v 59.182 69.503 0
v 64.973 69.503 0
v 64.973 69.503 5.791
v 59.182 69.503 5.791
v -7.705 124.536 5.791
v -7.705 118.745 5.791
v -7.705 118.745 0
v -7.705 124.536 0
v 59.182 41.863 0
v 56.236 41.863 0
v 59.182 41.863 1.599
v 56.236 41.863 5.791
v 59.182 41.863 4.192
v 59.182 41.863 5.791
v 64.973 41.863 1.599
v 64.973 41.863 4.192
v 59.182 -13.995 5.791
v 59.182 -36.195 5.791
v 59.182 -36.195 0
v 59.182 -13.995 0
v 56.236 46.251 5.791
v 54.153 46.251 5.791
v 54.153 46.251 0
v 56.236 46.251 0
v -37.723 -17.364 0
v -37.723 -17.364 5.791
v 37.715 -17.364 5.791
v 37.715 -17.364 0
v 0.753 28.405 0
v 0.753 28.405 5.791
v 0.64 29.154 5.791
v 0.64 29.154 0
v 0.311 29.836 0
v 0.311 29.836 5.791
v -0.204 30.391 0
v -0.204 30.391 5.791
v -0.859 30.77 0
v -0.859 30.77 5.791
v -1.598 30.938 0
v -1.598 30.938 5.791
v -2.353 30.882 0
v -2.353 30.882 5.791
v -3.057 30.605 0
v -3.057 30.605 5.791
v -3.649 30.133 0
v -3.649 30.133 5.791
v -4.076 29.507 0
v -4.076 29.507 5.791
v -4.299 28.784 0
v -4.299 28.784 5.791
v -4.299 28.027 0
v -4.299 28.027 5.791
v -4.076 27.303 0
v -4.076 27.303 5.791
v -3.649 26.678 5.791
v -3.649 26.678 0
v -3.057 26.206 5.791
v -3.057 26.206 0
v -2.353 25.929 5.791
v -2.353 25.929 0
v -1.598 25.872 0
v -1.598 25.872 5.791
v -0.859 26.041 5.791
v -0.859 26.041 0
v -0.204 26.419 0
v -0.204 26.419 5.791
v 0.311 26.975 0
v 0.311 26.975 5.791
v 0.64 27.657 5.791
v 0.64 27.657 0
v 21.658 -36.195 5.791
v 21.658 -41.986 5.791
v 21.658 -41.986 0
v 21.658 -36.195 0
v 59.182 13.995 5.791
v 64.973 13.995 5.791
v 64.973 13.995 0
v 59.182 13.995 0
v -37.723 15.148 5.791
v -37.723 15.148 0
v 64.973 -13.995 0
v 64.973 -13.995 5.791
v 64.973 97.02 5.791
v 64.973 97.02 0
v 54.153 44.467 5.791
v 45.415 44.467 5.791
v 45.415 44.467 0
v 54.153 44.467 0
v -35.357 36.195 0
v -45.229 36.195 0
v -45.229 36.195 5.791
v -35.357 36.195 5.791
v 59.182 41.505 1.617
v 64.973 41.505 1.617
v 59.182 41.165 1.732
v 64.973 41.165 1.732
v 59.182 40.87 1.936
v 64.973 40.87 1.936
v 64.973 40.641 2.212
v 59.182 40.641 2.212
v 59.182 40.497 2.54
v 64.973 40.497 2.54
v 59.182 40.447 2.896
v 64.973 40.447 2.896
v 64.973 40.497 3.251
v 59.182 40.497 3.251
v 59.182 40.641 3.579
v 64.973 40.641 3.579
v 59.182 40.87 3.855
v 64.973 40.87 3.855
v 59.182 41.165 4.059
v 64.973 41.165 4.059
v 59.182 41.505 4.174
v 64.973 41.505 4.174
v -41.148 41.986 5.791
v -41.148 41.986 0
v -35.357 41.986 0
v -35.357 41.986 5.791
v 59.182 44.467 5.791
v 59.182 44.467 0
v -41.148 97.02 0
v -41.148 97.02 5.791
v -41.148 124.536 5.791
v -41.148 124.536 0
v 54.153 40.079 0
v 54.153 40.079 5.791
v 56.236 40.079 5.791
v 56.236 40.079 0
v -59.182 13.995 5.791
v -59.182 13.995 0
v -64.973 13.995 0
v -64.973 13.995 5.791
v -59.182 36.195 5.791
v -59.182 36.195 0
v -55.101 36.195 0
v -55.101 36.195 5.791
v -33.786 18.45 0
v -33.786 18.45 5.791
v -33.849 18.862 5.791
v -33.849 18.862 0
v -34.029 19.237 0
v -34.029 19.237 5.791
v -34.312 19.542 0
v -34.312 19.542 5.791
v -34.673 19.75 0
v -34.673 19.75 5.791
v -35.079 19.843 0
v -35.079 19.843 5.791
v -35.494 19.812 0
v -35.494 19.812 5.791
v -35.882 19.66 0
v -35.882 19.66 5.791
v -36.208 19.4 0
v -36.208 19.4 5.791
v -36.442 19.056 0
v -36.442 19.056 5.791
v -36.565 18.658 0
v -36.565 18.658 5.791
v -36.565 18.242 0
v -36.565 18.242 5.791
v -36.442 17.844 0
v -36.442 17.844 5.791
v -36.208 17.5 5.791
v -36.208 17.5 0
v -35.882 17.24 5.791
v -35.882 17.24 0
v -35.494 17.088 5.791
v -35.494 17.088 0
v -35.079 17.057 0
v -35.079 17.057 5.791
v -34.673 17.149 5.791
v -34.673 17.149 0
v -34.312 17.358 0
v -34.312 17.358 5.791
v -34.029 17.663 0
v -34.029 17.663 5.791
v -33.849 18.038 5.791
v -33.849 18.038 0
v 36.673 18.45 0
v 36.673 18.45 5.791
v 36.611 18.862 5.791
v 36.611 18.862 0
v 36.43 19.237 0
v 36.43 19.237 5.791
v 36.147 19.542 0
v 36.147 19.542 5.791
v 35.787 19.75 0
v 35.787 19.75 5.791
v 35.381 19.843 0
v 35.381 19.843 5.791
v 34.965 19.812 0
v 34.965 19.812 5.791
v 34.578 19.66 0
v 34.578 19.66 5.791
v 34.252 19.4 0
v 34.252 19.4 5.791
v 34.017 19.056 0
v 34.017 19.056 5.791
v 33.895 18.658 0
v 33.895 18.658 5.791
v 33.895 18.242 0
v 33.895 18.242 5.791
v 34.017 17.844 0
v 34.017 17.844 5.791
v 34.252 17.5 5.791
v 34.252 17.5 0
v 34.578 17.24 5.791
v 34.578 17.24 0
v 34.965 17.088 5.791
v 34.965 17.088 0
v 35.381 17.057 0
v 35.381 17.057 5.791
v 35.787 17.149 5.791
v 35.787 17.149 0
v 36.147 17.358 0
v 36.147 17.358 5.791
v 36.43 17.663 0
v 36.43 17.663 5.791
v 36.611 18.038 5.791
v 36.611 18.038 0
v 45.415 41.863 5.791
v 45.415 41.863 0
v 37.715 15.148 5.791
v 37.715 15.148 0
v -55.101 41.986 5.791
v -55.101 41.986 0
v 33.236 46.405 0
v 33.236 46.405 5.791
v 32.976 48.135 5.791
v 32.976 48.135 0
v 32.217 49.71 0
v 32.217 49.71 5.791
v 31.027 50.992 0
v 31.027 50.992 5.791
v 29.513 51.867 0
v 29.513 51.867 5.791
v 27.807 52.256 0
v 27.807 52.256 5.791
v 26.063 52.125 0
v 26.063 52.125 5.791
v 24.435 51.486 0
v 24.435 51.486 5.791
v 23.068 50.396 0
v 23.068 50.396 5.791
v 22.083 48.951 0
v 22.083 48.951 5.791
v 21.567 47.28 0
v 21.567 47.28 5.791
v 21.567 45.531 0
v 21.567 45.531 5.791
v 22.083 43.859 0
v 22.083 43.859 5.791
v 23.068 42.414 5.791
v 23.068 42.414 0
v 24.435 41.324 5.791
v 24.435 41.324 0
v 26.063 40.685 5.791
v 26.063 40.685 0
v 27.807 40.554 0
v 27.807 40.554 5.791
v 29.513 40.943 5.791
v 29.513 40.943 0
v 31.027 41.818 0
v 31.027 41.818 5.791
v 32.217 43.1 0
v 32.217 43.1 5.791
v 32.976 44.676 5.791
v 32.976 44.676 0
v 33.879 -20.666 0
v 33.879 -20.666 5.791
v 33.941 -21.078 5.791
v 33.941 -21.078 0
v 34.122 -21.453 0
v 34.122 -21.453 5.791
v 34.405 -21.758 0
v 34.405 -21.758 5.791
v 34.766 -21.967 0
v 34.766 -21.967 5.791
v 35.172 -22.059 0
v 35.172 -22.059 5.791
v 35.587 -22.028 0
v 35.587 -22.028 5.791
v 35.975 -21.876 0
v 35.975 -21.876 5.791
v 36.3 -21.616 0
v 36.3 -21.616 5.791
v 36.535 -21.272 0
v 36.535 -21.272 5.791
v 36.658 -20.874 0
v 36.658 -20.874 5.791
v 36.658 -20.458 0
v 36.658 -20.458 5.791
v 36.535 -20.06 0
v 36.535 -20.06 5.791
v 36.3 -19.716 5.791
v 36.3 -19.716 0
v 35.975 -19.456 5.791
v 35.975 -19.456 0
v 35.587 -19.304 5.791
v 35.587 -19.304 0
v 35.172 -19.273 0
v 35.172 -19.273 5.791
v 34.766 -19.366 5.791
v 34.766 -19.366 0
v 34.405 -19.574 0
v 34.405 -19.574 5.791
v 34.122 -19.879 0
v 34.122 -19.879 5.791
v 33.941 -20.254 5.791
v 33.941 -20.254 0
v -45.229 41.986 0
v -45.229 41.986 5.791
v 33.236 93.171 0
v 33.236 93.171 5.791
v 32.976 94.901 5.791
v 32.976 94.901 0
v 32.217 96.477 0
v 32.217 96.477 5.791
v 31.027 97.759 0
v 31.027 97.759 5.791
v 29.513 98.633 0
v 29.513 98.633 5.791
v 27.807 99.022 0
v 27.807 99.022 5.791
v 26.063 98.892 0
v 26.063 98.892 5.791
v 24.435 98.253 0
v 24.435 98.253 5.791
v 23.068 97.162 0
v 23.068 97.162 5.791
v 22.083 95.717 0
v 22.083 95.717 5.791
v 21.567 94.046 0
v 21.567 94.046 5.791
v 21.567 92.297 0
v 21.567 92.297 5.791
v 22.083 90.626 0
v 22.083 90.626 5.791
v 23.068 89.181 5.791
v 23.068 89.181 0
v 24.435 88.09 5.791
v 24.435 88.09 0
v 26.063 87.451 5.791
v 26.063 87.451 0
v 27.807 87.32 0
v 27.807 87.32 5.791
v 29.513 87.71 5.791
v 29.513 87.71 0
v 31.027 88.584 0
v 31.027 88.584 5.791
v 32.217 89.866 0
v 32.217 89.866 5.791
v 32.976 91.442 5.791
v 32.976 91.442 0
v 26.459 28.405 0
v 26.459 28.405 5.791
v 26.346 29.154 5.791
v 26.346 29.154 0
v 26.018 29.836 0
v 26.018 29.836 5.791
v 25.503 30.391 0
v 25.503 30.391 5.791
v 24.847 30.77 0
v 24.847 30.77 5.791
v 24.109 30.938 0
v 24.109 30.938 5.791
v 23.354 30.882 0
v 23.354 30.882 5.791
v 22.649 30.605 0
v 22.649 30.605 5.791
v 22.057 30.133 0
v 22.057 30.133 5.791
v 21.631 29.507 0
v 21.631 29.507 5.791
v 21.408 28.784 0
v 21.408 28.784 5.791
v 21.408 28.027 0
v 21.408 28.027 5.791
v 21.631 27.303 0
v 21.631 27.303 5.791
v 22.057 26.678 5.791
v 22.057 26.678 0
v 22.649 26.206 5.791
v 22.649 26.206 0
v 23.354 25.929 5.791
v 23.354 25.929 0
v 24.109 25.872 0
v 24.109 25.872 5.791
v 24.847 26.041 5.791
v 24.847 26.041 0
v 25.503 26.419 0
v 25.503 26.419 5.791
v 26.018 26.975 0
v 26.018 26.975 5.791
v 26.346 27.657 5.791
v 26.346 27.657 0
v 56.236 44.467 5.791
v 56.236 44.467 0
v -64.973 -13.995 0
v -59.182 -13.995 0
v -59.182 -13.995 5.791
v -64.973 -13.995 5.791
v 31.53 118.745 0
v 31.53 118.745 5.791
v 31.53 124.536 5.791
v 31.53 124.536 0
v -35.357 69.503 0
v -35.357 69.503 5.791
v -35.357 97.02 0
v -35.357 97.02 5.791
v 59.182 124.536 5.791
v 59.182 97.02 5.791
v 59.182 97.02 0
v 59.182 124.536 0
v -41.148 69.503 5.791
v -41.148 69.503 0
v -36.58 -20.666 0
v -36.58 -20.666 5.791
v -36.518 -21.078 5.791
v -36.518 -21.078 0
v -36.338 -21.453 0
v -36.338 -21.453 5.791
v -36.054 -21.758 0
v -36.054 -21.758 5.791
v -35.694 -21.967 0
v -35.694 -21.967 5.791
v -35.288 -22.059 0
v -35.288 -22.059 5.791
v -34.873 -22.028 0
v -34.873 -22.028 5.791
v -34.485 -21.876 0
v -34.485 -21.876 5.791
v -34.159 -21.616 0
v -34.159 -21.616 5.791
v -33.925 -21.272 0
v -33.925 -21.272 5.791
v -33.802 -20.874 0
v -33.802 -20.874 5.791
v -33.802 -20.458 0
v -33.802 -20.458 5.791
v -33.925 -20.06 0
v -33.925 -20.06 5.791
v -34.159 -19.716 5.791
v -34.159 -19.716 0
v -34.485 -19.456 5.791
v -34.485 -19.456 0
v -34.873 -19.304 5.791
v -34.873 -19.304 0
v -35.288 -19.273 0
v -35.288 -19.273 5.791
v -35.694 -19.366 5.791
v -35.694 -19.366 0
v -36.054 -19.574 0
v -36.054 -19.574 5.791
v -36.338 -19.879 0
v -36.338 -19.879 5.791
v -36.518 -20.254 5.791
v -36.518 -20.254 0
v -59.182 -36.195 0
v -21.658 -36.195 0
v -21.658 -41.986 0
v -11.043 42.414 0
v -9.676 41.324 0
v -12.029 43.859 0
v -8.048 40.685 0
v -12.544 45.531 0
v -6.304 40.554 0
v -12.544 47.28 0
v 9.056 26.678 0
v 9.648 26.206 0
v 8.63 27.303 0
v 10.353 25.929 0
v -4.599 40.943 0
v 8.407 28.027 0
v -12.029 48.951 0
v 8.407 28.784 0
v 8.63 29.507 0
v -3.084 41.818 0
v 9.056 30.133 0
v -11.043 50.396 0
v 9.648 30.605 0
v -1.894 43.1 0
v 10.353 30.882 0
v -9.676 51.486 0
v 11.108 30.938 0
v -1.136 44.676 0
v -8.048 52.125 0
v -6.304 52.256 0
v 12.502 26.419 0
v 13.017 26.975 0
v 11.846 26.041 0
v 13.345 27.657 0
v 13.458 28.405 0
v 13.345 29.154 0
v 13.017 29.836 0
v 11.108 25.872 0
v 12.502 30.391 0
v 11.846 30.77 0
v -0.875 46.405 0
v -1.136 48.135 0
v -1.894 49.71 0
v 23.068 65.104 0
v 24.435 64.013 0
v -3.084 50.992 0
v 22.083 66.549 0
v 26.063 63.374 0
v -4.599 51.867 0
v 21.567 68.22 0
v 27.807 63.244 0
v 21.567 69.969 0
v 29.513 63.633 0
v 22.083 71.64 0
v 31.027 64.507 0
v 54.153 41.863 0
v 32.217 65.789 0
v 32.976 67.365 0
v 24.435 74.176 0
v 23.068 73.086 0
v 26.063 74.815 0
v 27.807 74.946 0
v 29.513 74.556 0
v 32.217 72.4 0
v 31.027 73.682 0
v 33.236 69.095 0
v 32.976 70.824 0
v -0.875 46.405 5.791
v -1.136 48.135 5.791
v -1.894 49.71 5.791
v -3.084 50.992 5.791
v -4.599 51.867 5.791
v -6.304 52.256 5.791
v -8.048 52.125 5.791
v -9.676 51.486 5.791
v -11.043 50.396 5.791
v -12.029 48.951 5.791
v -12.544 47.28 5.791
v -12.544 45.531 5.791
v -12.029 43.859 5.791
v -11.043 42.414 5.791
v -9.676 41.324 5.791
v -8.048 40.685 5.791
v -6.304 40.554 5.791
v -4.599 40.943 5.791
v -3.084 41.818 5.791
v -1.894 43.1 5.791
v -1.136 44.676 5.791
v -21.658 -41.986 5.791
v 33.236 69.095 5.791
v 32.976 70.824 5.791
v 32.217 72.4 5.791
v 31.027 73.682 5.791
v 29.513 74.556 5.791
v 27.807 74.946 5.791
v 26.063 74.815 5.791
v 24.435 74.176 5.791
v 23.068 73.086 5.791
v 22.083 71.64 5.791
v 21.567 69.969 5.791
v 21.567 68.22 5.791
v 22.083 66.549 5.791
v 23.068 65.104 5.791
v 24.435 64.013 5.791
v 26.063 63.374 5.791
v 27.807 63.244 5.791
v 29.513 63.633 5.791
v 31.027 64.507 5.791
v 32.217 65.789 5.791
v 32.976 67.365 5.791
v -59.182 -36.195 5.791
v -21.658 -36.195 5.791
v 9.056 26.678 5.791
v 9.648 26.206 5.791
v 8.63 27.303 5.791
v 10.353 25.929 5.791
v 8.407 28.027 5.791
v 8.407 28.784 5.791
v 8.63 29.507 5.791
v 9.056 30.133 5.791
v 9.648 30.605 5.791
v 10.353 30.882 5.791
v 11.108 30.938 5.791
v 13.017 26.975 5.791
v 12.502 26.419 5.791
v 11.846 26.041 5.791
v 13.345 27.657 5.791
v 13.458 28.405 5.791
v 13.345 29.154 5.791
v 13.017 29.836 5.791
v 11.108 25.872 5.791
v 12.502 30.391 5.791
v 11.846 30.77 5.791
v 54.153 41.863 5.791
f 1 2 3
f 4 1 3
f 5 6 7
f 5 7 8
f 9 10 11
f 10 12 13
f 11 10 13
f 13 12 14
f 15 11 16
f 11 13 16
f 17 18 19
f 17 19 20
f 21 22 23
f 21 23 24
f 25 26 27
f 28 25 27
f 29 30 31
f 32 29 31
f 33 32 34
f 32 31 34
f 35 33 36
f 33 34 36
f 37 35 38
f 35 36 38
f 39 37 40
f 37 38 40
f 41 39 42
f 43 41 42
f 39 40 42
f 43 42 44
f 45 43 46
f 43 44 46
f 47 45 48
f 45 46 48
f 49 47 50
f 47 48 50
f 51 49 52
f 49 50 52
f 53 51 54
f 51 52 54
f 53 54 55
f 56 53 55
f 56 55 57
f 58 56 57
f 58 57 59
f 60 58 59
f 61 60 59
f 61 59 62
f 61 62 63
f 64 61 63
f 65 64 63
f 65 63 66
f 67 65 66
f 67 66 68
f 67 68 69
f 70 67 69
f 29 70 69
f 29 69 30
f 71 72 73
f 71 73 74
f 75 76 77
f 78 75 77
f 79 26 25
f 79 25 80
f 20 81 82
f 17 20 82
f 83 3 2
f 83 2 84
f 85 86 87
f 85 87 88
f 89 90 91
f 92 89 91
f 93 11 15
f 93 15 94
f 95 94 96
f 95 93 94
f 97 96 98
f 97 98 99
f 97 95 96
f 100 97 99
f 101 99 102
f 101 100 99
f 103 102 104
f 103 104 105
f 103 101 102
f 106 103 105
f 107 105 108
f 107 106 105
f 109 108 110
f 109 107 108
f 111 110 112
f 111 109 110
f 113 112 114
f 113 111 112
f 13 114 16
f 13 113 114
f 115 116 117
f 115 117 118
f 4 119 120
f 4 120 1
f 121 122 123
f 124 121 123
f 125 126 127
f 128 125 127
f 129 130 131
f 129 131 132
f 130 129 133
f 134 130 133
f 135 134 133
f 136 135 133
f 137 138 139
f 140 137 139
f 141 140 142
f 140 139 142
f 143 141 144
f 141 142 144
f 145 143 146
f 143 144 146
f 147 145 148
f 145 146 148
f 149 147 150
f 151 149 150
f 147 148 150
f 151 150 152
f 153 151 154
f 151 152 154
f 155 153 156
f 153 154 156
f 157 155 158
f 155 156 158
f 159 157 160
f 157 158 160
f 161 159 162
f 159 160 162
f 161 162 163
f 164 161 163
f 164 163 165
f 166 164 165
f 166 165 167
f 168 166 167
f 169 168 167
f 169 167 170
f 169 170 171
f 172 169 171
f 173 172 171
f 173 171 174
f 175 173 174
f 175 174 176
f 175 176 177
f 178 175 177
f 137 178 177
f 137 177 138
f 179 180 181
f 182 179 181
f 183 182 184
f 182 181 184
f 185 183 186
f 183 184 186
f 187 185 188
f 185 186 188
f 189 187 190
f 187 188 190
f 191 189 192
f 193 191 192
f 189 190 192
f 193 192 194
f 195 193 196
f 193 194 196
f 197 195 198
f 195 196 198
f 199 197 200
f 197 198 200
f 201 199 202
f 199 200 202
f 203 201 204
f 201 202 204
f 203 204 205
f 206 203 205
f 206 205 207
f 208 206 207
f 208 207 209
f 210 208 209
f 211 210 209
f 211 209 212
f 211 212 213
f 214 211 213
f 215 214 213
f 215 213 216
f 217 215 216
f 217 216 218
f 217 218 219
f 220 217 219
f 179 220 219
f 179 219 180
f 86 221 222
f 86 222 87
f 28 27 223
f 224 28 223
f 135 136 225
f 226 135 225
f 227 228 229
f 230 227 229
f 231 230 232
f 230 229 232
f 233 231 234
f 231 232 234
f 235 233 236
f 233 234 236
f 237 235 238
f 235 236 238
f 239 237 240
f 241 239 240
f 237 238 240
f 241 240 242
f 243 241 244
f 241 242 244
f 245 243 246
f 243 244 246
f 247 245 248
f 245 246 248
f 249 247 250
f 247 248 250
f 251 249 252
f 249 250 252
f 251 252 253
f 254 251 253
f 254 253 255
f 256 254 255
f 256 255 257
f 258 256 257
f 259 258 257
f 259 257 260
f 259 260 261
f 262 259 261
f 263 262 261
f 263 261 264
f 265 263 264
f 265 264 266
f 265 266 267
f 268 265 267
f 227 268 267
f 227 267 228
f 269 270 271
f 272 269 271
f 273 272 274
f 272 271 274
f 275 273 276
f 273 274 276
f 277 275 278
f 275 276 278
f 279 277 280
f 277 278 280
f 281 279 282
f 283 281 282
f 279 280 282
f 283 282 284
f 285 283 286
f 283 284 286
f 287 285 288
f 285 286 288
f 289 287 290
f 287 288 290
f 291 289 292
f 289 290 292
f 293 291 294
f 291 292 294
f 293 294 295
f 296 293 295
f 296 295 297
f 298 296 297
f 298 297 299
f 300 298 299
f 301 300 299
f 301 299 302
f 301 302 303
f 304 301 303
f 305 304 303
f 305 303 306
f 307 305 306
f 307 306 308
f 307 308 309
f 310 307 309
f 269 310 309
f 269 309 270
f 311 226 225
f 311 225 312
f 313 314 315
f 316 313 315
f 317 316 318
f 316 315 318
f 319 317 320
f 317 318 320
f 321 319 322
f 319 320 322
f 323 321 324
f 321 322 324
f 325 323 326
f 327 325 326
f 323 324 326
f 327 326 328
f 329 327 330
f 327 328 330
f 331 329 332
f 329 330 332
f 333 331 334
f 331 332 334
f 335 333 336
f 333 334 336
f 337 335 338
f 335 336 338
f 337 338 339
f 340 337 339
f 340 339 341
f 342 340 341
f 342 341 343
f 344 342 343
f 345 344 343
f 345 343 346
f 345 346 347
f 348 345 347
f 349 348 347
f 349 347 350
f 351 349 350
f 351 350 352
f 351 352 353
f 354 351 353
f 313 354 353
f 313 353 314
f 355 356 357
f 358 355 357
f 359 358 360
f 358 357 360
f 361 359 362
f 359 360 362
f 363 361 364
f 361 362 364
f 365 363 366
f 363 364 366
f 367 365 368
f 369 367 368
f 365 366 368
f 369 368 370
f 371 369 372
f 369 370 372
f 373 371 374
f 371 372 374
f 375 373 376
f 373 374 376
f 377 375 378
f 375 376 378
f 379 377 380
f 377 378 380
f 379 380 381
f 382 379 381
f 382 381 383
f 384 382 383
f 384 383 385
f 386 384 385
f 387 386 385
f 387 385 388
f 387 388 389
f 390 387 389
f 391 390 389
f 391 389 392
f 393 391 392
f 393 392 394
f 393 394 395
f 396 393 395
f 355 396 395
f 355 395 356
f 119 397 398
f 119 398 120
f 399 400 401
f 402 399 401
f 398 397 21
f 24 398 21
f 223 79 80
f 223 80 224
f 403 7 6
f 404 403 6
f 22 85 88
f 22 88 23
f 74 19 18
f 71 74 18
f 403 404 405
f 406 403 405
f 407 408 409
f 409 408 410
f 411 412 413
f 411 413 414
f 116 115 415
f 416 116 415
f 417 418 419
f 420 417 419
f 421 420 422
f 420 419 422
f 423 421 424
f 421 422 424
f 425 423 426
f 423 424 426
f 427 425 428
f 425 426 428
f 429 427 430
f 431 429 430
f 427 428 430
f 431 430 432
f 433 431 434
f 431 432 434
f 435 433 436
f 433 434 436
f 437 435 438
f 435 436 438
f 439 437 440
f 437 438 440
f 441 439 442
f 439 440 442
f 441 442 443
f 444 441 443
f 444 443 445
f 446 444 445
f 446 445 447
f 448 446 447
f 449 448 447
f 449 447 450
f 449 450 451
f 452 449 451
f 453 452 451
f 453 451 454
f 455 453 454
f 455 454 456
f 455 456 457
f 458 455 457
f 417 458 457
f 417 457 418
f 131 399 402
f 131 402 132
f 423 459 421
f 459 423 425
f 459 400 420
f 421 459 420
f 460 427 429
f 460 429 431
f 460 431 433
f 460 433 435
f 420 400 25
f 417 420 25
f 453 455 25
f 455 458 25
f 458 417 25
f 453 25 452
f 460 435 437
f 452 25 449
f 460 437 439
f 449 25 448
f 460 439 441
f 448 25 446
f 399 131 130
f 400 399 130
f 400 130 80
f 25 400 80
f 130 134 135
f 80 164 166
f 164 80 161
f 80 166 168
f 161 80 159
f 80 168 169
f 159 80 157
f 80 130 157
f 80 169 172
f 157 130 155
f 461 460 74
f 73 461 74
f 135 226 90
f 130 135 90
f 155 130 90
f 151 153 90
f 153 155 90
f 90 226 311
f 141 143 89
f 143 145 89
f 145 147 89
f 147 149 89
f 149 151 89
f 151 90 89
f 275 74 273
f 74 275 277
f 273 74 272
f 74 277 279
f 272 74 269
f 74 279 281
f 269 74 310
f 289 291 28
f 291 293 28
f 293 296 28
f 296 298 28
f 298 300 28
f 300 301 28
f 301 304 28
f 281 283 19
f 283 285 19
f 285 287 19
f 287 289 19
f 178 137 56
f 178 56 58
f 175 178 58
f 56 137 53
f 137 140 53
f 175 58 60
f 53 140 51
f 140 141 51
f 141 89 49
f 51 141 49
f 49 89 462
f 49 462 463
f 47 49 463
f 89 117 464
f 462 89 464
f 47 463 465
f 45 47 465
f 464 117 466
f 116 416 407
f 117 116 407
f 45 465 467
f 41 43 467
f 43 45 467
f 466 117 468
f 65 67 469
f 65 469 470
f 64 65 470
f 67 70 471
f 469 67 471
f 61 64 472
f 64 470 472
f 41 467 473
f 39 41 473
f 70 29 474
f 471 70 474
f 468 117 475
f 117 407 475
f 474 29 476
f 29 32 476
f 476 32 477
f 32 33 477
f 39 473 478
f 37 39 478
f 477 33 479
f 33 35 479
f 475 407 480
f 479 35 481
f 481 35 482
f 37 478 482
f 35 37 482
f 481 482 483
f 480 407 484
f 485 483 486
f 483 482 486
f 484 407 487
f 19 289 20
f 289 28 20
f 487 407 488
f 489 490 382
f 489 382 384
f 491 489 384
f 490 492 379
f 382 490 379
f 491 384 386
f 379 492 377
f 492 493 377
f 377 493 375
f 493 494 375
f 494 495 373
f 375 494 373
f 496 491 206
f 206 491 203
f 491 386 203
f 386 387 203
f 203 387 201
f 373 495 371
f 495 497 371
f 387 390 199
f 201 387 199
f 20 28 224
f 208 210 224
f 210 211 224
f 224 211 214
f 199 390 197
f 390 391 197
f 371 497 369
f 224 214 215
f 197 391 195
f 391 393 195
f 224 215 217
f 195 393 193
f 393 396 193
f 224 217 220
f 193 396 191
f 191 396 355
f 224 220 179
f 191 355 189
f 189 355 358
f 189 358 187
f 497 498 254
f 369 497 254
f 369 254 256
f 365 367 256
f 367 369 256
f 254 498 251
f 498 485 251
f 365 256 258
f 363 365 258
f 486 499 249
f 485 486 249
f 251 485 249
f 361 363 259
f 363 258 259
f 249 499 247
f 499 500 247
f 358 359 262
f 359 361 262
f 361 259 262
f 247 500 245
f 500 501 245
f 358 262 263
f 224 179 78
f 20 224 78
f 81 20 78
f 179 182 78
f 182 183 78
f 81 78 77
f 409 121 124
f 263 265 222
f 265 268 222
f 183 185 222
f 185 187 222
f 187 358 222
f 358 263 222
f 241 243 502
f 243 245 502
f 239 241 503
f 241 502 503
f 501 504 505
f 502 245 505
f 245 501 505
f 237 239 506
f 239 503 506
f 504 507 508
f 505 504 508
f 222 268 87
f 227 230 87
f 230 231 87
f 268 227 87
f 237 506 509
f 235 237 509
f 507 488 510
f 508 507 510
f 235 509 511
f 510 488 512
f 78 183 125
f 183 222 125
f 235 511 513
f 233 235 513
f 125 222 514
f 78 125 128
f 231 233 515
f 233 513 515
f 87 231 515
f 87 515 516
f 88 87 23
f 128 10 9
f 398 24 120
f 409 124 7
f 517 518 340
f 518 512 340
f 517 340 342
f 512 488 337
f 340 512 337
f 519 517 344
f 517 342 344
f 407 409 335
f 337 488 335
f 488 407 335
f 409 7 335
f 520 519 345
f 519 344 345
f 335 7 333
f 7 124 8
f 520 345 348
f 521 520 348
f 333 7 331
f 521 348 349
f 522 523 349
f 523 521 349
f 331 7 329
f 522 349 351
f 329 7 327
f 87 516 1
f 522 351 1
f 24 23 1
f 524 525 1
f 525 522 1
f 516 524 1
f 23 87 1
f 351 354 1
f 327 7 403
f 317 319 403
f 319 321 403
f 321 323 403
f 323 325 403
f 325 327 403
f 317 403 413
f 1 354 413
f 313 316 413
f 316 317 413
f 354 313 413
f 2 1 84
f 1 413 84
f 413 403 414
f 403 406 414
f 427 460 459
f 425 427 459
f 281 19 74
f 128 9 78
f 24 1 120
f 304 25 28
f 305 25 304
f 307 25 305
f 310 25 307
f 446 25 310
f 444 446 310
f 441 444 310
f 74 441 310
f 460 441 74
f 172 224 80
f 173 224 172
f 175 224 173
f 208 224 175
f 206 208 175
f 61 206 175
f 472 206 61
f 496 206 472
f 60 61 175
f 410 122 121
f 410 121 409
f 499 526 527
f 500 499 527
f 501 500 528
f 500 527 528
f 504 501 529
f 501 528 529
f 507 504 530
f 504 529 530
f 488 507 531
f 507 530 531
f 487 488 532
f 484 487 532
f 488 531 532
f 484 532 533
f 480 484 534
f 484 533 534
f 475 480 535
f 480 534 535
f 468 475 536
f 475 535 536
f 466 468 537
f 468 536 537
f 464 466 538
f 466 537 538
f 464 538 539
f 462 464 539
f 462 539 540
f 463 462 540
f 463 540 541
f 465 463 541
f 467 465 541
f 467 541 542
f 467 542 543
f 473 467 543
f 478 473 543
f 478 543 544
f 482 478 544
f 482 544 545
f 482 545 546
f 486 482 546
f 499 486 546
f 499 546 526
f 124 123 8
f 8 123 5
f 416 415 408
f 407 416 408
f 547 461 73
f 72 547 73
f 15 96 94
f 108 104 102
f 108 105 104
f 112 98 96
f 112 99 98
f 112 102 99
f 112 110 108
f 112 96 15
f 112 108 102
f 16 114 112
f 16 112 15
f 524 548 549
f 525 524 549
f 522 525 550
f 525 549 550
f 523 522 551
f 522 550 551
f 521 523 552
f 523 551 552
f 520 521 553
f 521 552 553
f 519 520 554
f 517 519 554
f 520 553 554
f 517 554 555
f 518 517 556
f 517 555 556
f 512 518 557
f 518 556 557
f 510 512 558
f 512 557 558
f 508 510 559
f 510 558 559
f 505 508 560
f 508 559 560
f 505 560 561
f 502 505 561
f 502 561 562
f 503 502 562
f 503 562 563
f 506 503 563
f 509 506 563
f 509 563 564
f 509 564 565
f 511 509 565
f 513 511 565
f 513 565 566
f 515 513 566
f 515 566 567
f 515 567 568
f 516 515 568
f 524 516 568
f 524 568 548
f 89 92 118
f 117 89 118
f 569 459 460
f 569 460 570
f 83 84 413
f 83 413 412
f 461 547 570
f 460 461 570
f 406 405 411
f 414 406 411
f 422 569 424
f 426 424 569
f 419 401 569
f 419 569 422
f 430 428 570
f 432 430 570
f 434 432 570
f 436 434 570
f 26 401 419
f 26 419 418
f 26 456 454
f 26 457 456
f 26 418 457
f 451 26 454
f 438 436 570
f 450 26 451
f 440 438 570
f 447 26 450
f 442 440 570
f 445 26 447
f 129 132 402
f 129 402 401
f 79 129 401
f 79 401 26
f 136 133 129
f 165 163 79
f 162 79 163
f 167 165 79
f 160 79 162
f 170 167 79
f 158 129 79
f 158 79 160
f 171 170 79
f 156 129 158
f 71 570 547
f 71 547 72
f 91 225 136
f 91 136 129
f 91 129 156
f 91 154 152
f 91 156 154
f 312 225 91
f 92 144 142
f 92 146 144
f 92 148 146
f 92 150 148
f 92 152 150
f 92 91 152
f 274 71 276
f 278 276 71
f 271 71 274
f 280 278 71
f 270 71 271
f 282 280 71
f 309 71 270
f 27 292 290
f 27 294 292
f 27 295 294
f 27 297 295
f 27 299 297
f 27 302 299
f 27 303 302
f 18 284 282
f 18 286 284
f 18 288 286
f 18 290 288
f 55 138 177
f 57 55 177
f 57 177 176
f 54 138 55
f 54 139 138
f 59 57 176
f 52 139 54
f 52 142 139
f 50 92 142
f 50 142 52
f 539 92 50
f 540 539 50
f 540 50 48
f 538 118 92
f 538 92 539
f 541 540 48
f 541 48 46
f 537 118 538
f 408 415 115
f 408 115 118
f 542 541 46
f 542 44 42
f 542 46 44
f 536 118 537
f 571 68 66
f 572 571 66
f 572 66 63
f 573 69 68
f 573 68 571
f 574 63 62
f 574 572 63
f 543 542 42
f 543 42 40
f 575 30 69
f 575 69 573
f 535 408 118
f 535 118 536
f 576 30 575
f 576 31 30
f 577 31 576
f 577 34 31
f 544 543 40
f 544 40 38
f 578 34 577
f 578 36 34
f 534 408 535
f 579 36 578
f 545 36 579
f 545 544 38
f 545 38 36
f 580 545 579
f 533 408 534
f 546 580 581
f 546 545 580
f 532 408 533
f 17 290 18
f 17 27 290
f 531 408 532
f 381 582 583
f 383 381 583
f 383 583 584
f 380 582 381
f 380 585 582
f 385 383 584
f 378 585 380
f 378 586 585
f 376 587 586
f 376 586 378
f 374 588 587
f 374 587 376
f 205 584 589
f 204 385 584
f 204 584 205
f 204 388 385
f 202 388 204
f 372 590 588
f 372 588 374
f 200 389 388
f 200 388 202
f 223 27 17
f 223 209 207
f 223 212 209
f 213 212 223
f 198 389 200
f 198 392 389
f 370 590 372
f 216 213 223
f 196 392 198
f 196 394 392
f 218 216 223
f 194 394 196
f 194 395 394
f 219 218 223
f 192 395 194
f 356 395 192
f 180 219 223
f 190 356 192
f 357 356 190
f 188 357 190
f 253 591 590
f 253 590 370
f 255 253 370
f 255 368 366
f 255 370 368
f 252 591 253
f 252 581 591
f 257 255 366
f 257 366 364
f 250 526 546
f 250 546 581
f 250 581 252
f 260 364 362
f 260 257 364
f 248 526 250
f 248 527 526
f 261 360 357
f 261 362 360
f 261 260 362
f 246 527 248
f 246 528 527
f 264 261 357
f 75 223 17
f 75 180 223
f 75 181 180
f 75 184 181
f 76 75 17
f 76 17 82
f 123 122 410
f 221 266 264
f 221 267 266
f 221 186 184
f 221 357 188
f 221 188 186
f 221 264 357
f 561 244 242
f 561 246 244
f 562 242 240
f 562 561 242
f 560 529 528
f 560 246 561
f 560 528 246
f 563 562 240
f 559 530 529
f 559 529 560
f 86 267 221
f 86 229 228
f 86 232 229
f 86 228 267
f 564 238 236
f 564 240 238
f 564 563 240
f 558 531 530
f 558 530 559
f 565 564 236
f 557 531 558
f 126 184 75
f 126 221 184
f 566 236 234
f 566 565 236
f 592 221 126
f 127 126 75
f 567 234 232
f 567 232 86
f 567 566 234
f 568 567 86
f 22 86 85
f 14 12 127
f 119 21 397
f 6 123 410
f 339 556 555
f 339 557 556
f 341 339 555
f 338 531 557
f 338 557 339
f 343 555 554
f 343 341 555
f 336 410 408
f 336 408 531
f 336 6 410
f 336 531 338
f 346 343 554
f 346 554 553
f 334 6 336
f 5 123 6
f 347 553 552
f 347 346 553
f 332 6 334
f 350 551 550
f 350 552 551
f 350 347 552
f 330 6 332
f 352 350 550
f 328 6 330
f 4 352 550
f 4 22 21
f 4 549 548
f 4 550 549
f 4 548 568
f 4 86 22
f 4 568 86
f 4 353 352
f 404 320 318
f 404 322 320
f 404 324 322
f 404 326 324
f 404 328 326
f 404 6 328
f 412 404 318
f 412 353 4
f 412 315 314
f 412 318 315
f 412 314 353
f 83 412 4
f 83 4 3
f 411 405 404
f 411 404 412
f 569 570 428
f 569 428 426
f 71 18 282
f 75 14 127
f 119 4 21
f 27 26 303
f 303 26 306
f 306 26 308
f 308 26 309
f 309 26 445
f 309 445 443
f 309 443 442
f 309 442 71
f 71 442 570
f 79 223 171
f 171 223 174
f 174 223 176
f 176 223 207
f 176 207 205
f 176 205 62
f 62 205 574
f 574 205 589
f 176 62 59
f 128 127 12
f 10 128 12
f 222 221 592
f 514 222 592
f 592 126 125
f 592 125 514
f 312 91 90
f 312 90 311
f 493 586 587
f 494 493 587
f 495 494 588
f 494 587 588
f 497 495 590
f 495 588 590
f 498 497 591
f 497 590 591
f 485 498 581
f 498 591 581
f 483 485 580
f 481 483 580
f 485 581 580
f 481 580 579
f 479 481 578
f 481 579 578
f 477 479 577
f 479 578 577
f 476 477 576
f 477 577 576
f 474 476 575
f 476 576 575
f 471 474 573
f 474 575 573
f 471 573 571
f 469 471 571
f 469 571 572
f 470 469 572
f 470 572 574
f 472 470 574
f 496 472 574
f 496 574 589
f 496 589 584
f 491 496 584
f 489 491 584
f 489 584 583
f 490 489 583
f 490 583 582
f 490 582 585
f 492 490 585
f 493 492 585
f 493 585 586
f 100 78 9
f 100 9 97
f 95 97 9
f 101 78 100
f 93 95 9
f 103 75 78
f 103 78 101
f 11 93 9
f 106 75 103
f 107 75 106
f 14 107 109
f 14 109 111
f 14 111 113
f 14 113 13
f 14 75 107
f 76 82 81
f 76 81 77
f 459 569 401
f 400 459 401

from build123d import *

# Parameters (mm, degrees)
SKETCH1_W           = 129.9464
SKETCH1_H           = 83.9724
BOSS_EXTRUDE1_DEPTH = 5.7912
SKETCH7_W           = 106.1212
SKETCH7_H           = 82.55
BOSS_EXTRUDE2_DEPTH = 5.7912
SKETCH12_W          = 5.7912
SKETCH12_H          = 27.516666666
CUT_EXTRUDE9_DEPTH  = 141.585631649
SKETCH15_W          = 35.373733334
SKETCH15_H          = 5.7912
CUT_EXTRUDE12_DEPTH = 141.585631649
SKETCH18_R          = 1.397
SKETCH18_W          = 75.438
SKETCH18_H          = 32.512
CUT_EXTRUDE15_DEPTH = 141.585631649
SKETCH19_W          = 19.558
SKETCH19_H          = 2.6035
CUT_EXTRUDE16_DEPTH = 141.585631649
SKETCH20_W          = 2.0828
SKETCH20_H          = 6.1722
CUT_EXTRUDE17_DEPTH = 141.585631649
CAVITY1_START       = 59.182
CAVITY1_OUTLINE_W   = 27.9908
CAVITY1_OUTLINE_H   = 5.7912
CAVITY1_OUTLINE_W_2 = 25.036356667
CAVITY1_OUTLINE_W_3 = 27.516666667
CAVITY1_DEPTH       = 5.7912
CAVITY1_START_2     = -64.9732
CAVITY1_2_OUTLINE_W = 27.9908
CAVITY1_2_OUTLINE_H = 5.7912
CAVITY1_2_DEPTH     = 5.7912
CAVITY1_START_3     = -59.182
CAVITY1_3_OUTLINE_W = 5.7912
CAVITY1_3_OUTLINE_H = 5.7912
CAVITY1_3_DEPTH     = 37.524266667
CAVITY1_START_4     = 21.657733333
CAVITY1_4_OUTLINE_W = 5.7912
CAVITY1_4_OUTLINE_H = 5.7912
CAVITY1_4_DEPTH     = 37.524266667
CAVITY1_START_5     = -45.228933333
CAVITY1_5_OUTLINE_W = 5.7912
CAVITY1_5_OUTLINE_H = 5.7912
CAVITY1_5_DEPTH     = 9.872133333
CAVITY1_6_OUTLINE_W = 5.7912
CAVITY1_6_OUTLINE_H = 5.7912
CAVITY1_6_DEPTH     = 4.080933333
CAVITY1_START_6     = -7.704666667
CAVITY1_7_OUTLINE_W = 5.7912
CAVITY1_7_OUTLINE_H = 5.7912
CAVITY1_7_DEPTH     = 39.234533334
SKETCH21_R          = 2.54
CUT_EXTRUDE18_DEPTH = 141.585631649
SKETCH22_R          = 5.8674
SKETCH22_W          = 10.922
SKETCH22_H          = 12.7
CUT_EXTRUDE19_DEPTH = 141.585631649


# Read off the part's stored shape, not the designer's step: Cavity1
with BuildPart() as part:
    # Sketch1 → Boss-Extrude1 (new body)
    with BuildSketch(Plane.XY):
        Rectangle(SKETCH1_W, SKETCH1_H)
    extrude(amount=BOSS_EXTRUDE1_DEPTH)

    # Sketch7 → Boss-Extrude2 (add)
    with BuildSketch(Plane.XY.offset(5.7912)):
        with Locations((11.9126, 83.2612)):
            Rectangle(SKETCH7_W, SKETCH7_H)
    extrude(amount=-BOSS_EXTRUDE2_DEPTH)

    # Sketch12 → Cut-Extrude9 (cut, through all)
    with BuildSketch(Plane.XY.offset(5.7912)):
        with Locations((-38.2524, 83.2612)):
            Rectangle(SKETCH12_W, SKETCH12_H)
    extrude(amount=-CUT_EXTRUDE9_DEPTH, mode=Mode.SUBTRACT)

    # Sketch15 → Cut-Extrude12 (cut, through all)
    with BuildSketch(Plane.XY.offset(5.7912)):
        with Locations((11.9126, 121.6406)):
            Rectangle(SKETCH15_W, SKETCH15_H)
    extrude(amount=-CUT_EXTRUDE12_DEPTH, mode=Mode.SUBTRACT)

    # Sketch18 → Cut-Extrude15 (cut, through all)
    with BuildSketch(Plane.XY.offset(5.7912)):
        with Locations((-35.183452425, 18.449919855)):
            Circle(SKETCH18_R)
        with Locations((35.276147575, 18.449919855)):
            Circle(SKETCH18_R)
        with Locations(Location((35.276147575, -20.666080145, 0), (0, 0, 180))):
            Circle(SKETCH18_R)
        with Locations(Location((-35.183452425, -20.666080145, 0), (0, 0, 180))):
            Circle(SKETCH18_R)
        with Locations((-0.004452425, -1.108080145)):
            Rectangle(SKETCH18_W, SKETCH18_H)
    extrude(amount=-CUT_EXTRUDE15_DEPTH, mode=Mode.SUBTRACT)

    # Sketch19 → Cut-Extrude16 (cut, through all)
    with BuildSketch(Plane.XY.offset(5.7912)):
        with Locations((55.1942, 43.16476)):
            Rectangle(SKETCH19_W, SKETCH19_H)
    extrude(amount=-CUT_EXTRUDE16_DEPTH, mode=Mode.SUBTRACT)

    # Sketch20 → Cut-Extrude17 (cut, through all)
    with BuildSketch(Plane.XY.offset(5.7912)):
        with Locations((55.1942, 43.16476)):
            Rectangle(SKETCH20_W, SKETCH20_H)
    extrude(amount=-CUT_EXTRUDE17_DEPTH, mode=Mode.SUBTRACT)

    # Cavity1 outline → Cavity1 (cut)
    with BuildSketch(Plane.YZ.offset(CAVITY1_START)):
        with Locations((-27.9908, 2.8956)):
            Rectangle(CAVITY1_OUTLINE_W, CAVITY1_OUTLINE_H)
        with BuildLine():
            Line((13.9954, 5.7912), (13.9954, 0))
            Line((13.9954, 0), (41.86301, 0))
            Line((41.86301, 0), (41.86301, 1.598840513))
            ThreePointArc((41.86301, 1.598840513), (40.447383333, 2.8956), (41.86301, 4.192359487))
            Line((41.86301, 4.192359487), (41.86301, 5.7912))
            Line((41.86301, 5.7912), (13.9954, 5.7912))
        make_face()
        with Locations((56.984688334, 2.8956)):
            Rectangle(CAVITY1_OUTLINE_W_2, CAVITY1_OUTLINE_H)
        with Locations((110.777866667, 2.8956)):
            Rectangle(CAVITY1_OUTLINE_W_3, CAVITY1_OUTLINE_H)
    extrude(amount=CAVITY1_DEPTH, mode=Mode.SUBTRACT)

    # Cavity1 2 outline → Cavity1 2 (cut)
    with BuildSketch(Plane.YZ.offset(CAVITY1_START_2)):
        with Locations((-27.9908, 2.8956)):
            Rectangle(CAVITY1_2_OUTLINE_W, CAVITY1_2_OUTLINE_H)
        with Locations((27.9908, 2.8956)):
            Rectangle(CAVITY1_2_OUTLINE_W, CAVITY1_2_OUTLINE_H)
    extrude(amount=CAVITY1_2_DEPTH, mode=Mode.SUBTRACT)

    # Cavity1 3 outline → Cavity1 3 (cut)
    with BuildSketch(Plane.YZ.offset(CAVITY1_START_3)):
        with Locations((-39.0906, 2.8956)):
            Rectangle(CAVITY1_3_OUTLINE_W, CAVITY1_3_OUTLINE_H)
    extrude(amount=CAVITY1_3_DEPTH, mode=Mode.SUBTRACT)

    # Cavity1 4 outline → Cavity1 4 (cut)
    with BuildSketch(Plane.YZ.offset(CAVITY1_START_4)):
        with Locations((-39.0906, 2.8956)):
            Rectangle(CAVITY1_4_OUTLINE_W, CAVITY1_4_OUTLINE_H)
    extrude(amount=CAVITY1_4_DEPTH, mode=Mode.SUBTRACT)

    # Cavity1 5 outline → Cavity1 5 (cut)
    with BuildSketch(Plane.YZ.offset(CAVITY1_START_5)):
        with Locations((39.0906, 2.8956)):
            Rectangle(CAVITY1_5_OUTLINE_W, CAVITY1_5_OUTLINE_H)
    extrude(amount=CAVITY1_5_DEPTH, mode=Mode.SUBTRACT)

    # Cavity1 6 outline → Cavity1 6 (cut)
    with BuildSketch(Plane.YZ.offset(CAVITY1_START_3)):
        with Locations((39.0906, 2.8956)):
            Rectangle(CAVITY1_6_OUTLINE_W, CAVITY1_6_OUTLINE_H)
    extrude(amount=CAVITY1_6_DEPTH, mode=Mode.SUBTRACT)

    # Cavity1 7 outline → Cavity1 7 (cut)
    with BuildSketch(Plane.YZ.offset(CAVITY1_START_6)):
        with Locations((121.6406, 2.8956)):
            Rectangle(CAVITY1_7_OUTLINE_W, CAVITY1_7_OUTLINE_H)
    extrude(amount=CAVITY1_7_DEPTH, mode=Mode.SUBTRACT)

    # Sketch21 → Cut-Extrude18 (cut, through all)
    with BuildSketch(Plane.XY.offset(5.7912)):
        with Locations((23.919169713, 28.405342819)):
            Circle(SKETCH21_R)
        with Locations((10.918159713, 28.405342819)):
            Circle(SKETCH21_R)
        with Locations((-1.787317277, 28.405342819)):
            Circle(SKETCH21_R)
    extrude(amount=-CUT_EXTRUDE18_DEPTH, mode=Mode.SUBTRACT)

    # Sketch22 → Cut-Extrude19 (cut, through all)
    with BuildSketch(Plane.XY.offset(5.7912)):
        with Locations((27.368980229, 46.405060213)):
            Circle(SKETCH22_R)
        with Locations((-6.74229364, 46.405060213)):
            Circle(SKETCH22_R)
        with Locations((27.368980229, 69.094682683)):
            Circle(SKETCH22_R)
        with Locations((27.368980229, 93.171449402)):
            Circle(SKETCH22_R)
        with Locations((995.334727121, -604.282322998)):
            Rectangle(SKETCH22_W, SKETCH22_H)
        with Locations((995.334727121, -676.824722998)):
            Rectangle(SKETCH22_W, SKETCH22_H)
        with Locations((995.334727121, -628.971122998)):
            Rectangle(SKETCH22_W, SKETCH22_H)
        with Locations((995.334727121, -653.117356371)):
            Rectangle(SKETCH22_W, SKETCH22_H)
    extrude(amount=-CUT_EXTRUDE19_DEPTH, mode=Mode.SUBTRACT)


solid = part.part
